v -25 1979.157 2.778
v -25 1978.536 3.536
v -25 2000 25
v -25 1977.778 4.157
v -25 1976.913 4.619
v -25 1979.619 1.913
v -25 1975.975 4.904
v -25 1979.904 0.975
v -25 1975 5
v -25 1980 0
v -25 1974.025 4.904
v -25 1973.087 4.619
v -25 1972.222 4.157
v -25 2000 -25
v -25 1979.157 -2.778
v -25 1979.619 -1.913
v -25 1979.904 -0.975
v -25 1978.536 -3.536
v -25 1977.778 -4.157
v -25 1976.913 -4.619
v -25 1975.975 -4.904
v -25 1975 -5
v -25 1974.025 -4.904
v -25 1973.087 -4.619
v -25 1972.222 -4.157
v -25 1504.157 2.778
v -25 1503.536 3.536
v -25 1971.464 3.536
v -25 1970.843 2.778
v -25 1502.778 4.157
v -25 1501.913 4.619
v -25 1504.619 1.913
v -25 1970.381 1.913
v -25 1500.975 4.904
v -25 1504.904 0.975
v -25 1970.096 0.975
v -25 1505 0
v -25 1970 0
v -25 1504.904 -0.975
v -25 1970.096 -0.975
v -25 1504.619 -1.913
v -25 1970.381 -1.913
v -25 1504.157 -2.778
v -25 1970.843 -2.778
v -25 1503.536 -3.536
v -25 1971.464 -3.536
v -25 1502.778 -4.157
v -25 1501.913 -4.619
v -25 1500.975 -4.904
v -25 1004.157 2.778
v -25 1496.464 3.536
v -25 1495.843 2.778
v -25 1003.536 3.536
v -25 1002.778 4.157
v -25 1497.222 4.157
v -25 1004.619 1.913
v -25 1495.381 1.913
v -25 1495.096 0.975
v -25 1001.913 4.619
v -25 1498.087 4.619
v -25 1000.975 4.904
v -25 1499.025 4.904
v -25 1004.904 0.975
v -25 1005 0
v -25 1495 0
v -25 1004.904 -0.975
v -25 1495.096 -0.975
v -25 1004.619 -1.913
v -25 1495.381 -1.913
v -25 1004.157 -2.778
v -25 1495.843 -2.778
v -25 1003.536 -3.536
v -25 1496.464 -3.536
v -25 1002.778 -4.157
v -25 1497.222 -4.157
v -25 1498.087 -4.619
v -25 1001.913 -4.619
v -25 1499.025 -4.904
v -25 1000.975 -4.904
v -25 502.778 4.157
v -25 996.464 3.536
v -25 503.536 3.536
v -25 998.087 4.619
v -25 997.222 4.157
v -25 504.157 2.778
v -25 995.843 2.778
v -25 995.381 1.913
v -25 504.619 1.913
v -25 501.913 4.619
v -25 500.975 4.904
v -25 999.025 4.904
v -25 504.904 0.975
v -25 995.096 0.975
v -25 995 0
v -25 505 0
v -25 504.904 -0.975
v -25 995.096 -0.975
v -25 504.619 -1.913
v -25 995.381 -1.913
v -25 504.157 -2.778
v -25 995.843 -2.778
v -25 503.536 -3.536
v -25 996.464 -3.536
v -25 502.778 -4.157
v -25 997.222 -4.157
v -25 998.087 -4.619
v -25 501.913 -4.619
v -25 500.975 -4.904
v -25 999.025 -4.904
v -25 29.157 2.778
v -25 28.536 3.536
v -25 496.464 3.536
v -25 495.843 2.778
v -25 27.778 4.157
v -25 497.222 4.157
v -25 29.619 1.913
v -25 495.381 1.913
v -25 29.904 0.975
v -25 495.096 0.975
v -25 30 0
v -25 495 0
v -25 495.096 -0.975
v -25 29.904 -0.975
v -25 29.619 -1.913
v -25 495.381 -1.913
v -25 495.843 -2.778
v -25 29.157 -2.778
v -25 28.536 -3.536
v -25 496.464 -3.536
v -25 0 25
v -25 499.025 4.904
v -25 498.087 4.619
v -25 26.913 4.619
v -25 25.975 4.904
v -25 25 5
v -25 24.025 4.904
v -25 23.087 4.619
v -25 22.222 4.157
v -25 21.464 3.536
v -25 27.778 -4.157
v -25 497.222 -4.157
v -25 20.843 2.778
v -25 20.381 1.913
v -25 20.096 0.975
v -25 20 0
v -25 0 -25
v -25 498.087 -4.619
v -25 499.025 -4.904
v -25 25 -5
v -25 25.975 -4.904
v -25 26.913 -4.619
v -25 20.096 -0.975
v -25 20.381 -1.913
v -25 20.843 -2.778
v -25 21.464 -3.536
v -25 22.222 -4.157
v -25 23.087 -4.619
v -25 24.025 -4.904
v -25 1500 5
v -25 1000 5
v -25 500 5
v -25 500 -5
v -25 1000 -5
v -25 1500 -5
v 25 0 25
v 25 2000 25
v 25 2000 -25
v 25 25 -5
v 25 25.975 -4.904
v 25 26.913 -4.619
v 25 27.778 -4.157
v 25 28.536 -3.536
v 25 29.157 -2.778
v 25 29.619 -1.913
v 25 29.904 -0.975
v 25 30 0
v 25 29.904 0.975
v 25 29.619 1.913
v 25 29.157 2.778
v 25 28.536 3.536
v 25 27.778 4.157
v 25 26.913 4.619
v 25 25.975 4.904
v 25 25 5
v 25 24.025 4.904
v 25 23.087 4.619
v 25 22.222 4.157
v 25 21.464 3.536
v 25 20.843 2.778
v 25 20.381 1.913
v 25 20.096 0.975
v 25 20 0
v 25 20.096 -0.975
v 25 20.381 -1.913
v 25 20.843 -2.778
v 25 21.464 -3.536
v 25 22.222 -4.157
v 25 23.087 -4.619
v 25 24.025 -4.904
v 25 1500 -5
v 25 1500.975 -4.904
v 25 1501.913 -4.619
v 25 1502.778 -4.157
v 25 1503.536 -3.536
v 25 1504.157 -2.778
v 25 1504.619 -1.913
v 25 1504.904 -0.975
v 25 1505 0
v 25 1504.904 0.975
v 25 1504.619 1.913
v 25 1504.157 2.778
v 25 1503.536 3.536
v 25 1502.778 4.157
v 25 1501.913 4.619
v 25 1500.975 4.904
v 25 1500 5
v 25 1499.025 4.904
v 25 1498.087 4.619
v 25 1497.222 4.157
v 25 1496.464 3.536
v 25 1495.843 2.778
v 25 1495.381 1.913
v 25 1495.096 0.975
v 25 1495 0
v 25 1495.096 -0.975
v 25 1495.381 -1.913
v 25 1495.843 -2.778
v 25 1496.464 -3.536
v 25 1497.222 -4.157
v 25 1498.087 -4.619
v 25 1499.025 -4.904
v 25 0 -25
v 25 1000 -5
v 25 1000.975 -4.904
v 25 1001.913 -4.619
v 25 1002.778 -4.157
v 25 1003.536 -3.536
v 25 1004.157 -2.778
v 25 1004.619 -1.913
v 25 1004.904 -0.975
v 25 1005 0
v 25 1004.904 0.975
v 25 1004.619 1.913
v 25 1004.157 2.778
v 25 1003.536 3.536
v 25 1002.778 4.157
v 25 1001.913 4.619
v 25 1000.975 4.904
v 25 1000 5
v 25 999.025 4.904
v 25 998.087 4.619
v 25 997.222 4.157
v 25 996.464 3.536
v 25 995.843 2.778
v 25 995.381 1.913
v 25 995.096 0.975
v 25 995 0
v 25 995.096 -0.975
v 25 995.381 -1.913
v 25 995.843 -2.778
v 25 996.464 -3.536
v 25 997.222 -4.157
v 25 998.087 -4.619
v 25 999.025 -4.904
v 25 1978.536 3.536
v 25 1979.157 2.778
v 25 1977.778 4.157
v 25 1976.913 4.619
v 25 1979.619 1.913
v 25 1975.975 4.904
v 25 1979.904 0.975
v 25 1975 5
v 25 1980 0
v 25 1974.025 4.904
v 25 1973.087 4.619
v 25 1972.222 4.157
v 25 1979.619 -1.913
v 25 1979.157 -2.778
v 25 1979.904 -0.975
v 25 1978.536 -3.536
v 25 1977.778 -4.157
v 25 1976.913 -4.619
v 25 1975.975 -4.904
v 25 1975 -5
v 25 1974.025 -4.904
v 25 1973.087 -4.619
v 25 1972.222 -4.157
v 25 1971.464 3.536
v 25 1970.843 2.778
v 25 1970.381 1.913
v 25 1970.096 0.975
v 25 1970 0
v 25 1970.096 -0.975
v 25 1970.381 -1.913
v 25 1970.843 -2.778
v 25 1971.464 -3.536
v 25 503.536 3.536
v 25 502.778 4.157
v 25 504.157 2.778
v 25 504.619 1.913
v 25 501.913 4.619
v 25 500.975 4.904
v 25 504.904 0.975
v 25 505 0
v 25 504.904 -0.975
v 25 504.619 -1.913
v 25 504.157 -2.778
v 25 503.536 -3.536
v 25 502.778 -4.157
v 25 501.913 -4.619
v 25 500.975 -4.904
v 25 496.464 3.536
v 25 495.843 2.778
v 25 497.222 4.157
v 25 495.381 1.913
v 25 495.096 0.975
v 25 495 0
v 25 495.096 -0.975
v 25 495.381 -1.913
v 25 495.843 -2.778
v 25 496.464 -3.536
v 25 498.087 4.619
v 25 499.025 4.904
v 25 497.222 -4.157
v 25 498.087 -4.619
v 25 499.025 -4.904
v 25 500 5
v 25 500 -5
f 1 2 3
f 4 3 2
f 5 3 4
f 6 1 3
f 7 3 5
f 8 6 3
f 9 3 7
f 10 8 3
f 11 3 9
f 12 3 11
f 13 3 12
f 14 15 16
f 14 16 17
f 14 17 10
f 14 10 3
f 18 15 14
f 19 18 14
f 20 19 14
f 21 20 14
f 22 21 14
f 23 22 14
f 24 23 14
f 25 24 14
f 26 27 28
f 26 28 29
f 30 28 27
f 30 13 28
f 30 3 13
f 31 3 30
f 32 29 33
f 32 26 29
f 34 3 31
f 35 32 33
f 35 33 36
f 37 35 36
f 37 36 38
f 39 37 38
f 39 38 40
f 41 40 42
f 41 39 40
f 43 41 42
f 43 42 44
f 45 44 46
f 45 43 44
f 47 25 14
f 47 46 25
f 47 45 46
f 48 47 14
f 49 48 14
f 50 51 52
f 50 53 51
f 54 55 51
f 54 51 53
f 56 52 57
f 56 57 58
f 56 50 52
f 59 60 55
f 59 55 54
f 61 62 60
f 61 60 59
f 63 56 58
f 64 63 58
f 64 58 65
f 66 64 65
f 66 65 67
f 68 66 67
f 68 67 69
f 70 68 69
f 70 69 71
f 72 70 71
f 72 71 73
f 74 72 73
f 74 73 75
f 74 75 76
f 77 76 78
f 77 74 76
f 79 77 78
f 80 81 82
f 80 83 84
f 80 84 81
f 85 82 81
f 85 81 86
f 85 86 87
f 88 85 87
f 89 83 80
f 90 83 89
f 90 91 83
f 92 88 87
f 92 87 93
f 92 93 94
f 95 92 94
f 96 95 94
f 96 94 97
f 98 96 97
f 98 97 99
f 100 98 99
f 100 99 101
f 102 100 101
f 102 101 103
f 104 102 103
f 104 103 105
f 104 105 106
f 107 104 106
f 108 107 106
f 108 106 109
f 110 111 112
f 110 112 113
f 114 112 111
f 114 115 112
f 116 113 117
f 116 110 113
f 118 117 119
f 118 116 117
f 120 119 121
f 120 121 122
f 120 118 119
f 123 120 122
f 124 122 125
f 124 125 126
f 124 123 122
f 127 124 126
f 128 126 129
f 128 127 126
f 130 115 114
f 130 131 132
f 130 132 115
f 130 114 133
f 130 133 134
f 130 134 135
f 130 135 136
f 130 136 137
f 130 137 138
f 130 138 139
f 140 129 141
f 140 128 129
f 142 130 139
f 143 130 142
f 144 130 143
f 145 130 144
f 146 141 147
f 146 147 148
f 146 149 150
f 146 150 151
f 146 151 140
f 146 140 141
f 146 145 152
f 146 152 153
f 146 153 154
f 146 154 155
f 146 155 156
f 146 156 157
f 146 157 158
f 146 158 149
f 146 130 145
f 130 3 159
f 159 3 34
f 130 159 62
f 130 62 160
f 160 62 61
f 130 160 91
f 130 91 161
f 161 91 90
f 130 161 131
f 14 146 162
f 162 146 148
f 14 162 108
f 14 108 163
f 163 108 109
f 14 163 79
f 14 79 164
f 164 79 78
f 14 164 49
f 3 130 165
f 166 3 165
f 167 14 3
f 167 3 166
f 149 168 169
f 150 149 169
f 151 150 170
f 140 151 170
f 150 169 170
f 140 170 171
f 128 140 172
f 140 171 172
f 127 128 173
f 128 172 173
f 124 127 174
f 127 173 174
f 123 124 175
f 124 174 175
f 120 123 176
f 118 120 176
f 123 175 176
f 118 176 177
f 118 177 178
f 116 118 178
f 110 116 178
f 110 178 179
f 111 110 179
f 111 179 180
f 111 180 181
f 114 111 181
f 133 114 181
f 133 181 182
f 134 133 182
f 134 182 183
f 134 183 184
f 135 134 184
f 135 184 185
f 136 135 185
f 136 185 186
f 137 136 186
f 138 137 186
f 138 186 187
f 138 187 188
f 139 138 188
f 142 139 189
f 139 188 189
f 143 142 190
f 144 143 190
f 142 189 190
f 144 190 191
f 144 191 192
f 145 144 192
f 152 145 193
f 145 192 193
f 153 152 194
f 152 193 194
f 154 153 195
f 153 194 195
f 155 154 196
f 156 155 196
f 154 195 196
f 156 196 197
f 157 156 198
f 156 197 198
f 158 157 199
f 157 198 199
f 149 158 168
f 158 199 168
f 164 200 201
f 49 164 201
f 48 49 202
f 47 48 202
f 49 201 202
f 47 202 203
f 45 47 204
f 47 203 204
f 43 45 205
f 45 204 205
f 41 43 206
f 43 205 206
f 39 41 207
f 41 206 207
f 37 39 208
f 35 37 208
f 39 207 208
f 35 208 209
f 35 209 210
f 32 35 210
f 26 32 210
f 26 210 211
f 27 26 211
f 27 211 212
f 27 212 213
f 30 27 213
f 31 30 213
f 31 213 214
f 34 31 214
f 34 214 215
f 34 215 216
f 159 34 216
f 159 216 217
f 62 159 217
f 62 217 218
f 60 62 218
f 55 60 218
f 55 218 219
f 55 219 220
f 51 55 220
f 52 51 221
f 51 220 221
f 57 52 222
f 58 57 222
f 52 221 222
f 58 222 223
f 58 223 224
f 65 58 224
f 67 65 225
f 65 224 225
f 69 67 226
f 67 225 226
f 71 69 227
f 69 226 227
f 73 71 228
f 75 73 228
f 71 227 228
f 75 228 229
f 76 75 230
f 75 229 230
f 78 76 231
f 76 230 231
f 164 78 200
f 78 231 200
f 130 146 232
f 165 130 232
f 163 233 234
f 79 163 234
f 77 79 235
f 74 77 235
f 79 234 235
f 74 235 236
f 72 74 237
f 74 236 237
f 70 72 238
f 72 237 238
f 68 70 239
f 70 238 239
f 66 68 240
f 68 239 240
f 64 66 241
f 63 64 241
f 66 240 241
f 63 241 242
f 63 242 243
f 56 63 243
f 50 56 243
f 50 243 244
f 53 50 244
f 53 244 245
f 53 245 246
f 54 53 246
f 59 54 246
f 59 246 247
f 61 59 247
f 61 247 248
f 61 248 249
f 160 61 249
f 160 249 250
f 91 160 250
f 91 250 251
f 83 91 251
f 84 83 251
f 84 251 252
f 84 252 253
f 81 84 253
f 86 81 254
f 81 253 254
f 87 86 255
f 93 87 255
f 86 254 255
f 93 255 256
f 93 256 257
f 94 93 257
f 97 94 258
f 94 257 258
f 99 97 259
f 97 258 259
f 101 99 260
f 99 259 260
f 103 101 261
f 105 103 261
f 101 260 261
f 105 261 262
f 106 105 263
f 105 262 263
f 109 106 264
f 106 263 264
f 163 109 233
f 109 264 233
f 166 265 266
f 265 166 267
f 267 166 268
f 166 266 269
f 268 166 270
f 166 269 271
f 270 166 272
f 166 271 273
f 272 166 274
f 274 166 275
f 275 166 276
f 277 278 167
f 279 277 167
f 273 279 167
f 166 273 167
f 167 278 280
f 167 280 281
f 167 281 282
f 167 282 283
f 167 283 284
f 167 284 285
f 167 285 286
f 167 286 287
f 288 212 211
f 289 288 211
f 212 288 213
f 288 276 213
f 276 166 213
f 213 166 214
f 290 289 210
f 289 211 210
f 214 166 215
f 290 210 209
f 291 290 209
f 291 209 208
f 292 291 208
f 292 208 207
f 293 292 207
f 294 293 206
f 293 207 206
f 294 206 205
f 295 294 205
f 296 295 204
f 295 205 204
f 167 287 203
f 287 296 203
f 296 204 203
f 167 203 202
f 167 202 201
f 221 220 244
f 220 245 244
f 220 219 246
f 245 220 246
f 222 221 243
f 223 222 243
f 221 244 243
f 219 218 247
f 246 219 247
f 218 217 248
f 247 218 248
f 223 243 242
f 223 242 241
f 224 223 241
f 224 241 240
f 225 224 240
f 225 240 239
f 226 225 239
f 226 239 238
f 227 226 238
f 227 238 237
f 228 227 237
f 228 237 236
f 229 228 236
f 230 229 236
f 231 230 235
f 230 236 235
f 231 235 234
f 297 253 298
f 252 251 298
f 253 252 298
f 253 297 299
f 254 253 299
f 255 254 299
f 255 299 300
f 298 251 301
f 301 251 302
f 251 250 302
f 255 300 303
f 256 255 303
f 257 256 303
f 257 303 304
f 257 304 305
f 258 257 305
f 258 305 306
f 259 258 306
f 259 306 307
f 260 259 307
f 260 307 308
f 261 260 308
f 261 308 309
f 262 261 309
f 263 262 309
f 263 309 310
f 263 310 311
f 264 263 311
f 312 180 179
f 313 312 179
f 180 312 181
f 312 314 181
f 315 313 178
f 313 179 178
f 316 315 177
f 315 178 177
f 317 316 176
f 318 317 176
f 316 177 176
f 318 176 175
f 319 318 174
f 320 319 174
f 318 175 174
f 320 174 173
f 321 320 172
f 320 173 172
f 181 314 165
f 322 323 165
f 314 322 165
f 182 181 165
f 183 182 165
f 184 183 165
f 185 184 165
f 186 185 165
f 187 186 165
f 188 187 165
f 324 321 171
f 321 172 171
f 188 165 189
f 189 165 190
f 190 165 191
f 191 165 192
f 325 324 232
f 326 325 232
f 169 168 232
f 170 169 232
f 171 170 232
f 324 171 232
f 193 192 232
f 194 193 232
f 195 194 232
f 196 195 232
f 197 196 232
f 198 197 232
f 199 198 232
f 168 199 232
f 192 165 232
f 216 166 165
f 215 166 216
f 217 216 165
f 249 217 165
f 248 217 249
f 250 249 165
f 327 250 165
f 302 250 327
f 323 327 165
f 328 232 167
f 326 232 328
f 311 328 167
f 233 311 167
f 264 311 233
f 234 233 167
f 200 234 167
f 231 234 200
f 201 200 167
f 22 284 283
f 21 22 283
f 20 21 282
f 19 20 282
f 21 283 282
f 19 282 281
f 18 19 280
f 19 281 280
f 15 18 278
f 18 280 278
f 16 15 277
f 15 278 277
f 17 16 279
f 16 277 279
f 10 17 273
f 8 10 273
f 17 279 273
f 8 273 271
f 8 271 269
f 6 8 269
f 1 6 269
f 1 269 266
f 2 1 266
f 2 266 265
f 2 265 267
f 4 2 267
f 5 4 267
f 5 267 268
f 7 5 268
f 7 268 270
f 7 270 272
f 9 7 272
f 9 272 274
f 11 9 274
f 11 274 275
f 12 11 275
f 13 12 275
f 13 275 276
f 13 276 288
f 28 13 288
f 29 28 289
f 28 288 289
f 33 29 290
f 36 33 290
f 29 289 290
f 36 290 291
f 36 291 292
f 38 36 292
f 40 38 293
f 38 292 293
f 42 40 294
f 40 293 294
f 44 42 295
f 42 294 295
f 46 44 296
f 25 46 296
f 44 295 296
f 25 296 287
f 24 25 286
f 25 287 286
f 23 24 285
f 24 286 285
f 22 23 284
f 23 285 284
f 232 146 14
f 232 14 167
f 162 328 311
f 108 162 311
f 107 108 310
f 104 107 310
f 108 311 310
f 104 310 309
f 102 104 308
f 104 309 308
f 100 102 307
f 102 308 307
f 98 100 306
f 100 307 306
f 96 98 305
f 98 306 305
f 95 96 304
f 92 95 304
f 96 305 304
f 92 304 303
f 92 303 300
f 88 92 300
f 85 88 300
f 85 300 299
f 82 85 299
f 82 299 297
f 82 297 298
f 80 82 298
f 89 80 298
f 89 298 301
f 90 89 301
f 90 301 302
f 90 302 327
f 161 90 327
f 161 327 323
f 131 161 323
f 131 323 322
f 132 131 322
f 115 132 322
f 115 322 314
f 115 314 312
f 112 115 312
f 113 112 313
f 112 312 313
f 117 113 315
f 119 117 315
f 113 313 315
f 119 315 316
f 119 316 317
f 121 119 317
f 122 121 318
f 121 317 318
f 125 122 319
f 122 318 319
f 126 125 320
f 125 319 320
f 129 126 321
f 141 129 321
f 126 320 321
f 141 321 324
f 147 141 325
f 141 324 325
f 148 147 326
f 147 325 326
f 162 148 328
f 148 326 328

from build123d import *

# Parameters (mm, degrees)
SKETCH_1_W          = 50
SKETCH_1_H          = 50
EXTRUDE_2_DEPTH     = 2000
SKETCH_2_R          = 5
CUT_EXTRUDE_1_DEPTH = 2001.781097472
SKETCH_3_R          = 5
CUT_EXTRUDE_2_DEPTH = 2001.781097472
SKETCH_4_R          = 5
CUT_EXTRUDE_3_DEPTH = 2001.781097472


with BuildPart() as part:
    # Эскиз1 → Бобышка-Вытянуть2 (new body)
    with BuildSketch(Plane(origin=(0, 0, 0), x_dir=(1, 0, 0), z_dir=(0, 1, 0))):
        Rectangle(SKETCH_1_W, SKETCH_1_H)
    extrude(amount=EXTRUDE_2_DEPTH)

    # Эскиз2 → Вырез-Вытянуть1 (cut, through all)
    with BuildSketch(Plane(origin=(25, 0, 0), x_dir=(0, 0, -1), z_dir=(1, 0, 0))):
        with Locations((0, 1975)):
            Circle(SKETCH_2_R)
        with Locations((0, 25)):
            Circle(SKETCH_2_R)
    extrude(amount=-CUT_EXTRUDE_1_DEPTH, mode=Mode.SUBTRACT)

    # Эскиз3 → Вырез-Вытянуть2 (cut, through all)
    with BuildSketch(Plane(origin=(25, 0, 0), x_dir=(0, 0, -1), z_dir=(1, 0, 0))):
        with Locations((0, 1000)):
            Circle(SKETCH_3_R)
    extrude(amount=-CUT_EXTRUDE_2_DEPTH, mode=Mode.SUBTRACT)

    # Эскиз4 → Вырез-Вытянуть3 (cut, through all)
    with BuildSketch(Plane(origin=(25, 0, 0), x_dir=(0, 0, -1), z_dir=(1, 0, 0))):
        with Locations((0, 1500)):
            Circle(SKETCH_4_R)
        with Locations((0, 500)):
            Circle(SKETCH_4_R)
    extrude(amount=-CUT_EXTRUDE_3_DEPTH, mode=Mode.SUBTRACT)


solid = part.part
